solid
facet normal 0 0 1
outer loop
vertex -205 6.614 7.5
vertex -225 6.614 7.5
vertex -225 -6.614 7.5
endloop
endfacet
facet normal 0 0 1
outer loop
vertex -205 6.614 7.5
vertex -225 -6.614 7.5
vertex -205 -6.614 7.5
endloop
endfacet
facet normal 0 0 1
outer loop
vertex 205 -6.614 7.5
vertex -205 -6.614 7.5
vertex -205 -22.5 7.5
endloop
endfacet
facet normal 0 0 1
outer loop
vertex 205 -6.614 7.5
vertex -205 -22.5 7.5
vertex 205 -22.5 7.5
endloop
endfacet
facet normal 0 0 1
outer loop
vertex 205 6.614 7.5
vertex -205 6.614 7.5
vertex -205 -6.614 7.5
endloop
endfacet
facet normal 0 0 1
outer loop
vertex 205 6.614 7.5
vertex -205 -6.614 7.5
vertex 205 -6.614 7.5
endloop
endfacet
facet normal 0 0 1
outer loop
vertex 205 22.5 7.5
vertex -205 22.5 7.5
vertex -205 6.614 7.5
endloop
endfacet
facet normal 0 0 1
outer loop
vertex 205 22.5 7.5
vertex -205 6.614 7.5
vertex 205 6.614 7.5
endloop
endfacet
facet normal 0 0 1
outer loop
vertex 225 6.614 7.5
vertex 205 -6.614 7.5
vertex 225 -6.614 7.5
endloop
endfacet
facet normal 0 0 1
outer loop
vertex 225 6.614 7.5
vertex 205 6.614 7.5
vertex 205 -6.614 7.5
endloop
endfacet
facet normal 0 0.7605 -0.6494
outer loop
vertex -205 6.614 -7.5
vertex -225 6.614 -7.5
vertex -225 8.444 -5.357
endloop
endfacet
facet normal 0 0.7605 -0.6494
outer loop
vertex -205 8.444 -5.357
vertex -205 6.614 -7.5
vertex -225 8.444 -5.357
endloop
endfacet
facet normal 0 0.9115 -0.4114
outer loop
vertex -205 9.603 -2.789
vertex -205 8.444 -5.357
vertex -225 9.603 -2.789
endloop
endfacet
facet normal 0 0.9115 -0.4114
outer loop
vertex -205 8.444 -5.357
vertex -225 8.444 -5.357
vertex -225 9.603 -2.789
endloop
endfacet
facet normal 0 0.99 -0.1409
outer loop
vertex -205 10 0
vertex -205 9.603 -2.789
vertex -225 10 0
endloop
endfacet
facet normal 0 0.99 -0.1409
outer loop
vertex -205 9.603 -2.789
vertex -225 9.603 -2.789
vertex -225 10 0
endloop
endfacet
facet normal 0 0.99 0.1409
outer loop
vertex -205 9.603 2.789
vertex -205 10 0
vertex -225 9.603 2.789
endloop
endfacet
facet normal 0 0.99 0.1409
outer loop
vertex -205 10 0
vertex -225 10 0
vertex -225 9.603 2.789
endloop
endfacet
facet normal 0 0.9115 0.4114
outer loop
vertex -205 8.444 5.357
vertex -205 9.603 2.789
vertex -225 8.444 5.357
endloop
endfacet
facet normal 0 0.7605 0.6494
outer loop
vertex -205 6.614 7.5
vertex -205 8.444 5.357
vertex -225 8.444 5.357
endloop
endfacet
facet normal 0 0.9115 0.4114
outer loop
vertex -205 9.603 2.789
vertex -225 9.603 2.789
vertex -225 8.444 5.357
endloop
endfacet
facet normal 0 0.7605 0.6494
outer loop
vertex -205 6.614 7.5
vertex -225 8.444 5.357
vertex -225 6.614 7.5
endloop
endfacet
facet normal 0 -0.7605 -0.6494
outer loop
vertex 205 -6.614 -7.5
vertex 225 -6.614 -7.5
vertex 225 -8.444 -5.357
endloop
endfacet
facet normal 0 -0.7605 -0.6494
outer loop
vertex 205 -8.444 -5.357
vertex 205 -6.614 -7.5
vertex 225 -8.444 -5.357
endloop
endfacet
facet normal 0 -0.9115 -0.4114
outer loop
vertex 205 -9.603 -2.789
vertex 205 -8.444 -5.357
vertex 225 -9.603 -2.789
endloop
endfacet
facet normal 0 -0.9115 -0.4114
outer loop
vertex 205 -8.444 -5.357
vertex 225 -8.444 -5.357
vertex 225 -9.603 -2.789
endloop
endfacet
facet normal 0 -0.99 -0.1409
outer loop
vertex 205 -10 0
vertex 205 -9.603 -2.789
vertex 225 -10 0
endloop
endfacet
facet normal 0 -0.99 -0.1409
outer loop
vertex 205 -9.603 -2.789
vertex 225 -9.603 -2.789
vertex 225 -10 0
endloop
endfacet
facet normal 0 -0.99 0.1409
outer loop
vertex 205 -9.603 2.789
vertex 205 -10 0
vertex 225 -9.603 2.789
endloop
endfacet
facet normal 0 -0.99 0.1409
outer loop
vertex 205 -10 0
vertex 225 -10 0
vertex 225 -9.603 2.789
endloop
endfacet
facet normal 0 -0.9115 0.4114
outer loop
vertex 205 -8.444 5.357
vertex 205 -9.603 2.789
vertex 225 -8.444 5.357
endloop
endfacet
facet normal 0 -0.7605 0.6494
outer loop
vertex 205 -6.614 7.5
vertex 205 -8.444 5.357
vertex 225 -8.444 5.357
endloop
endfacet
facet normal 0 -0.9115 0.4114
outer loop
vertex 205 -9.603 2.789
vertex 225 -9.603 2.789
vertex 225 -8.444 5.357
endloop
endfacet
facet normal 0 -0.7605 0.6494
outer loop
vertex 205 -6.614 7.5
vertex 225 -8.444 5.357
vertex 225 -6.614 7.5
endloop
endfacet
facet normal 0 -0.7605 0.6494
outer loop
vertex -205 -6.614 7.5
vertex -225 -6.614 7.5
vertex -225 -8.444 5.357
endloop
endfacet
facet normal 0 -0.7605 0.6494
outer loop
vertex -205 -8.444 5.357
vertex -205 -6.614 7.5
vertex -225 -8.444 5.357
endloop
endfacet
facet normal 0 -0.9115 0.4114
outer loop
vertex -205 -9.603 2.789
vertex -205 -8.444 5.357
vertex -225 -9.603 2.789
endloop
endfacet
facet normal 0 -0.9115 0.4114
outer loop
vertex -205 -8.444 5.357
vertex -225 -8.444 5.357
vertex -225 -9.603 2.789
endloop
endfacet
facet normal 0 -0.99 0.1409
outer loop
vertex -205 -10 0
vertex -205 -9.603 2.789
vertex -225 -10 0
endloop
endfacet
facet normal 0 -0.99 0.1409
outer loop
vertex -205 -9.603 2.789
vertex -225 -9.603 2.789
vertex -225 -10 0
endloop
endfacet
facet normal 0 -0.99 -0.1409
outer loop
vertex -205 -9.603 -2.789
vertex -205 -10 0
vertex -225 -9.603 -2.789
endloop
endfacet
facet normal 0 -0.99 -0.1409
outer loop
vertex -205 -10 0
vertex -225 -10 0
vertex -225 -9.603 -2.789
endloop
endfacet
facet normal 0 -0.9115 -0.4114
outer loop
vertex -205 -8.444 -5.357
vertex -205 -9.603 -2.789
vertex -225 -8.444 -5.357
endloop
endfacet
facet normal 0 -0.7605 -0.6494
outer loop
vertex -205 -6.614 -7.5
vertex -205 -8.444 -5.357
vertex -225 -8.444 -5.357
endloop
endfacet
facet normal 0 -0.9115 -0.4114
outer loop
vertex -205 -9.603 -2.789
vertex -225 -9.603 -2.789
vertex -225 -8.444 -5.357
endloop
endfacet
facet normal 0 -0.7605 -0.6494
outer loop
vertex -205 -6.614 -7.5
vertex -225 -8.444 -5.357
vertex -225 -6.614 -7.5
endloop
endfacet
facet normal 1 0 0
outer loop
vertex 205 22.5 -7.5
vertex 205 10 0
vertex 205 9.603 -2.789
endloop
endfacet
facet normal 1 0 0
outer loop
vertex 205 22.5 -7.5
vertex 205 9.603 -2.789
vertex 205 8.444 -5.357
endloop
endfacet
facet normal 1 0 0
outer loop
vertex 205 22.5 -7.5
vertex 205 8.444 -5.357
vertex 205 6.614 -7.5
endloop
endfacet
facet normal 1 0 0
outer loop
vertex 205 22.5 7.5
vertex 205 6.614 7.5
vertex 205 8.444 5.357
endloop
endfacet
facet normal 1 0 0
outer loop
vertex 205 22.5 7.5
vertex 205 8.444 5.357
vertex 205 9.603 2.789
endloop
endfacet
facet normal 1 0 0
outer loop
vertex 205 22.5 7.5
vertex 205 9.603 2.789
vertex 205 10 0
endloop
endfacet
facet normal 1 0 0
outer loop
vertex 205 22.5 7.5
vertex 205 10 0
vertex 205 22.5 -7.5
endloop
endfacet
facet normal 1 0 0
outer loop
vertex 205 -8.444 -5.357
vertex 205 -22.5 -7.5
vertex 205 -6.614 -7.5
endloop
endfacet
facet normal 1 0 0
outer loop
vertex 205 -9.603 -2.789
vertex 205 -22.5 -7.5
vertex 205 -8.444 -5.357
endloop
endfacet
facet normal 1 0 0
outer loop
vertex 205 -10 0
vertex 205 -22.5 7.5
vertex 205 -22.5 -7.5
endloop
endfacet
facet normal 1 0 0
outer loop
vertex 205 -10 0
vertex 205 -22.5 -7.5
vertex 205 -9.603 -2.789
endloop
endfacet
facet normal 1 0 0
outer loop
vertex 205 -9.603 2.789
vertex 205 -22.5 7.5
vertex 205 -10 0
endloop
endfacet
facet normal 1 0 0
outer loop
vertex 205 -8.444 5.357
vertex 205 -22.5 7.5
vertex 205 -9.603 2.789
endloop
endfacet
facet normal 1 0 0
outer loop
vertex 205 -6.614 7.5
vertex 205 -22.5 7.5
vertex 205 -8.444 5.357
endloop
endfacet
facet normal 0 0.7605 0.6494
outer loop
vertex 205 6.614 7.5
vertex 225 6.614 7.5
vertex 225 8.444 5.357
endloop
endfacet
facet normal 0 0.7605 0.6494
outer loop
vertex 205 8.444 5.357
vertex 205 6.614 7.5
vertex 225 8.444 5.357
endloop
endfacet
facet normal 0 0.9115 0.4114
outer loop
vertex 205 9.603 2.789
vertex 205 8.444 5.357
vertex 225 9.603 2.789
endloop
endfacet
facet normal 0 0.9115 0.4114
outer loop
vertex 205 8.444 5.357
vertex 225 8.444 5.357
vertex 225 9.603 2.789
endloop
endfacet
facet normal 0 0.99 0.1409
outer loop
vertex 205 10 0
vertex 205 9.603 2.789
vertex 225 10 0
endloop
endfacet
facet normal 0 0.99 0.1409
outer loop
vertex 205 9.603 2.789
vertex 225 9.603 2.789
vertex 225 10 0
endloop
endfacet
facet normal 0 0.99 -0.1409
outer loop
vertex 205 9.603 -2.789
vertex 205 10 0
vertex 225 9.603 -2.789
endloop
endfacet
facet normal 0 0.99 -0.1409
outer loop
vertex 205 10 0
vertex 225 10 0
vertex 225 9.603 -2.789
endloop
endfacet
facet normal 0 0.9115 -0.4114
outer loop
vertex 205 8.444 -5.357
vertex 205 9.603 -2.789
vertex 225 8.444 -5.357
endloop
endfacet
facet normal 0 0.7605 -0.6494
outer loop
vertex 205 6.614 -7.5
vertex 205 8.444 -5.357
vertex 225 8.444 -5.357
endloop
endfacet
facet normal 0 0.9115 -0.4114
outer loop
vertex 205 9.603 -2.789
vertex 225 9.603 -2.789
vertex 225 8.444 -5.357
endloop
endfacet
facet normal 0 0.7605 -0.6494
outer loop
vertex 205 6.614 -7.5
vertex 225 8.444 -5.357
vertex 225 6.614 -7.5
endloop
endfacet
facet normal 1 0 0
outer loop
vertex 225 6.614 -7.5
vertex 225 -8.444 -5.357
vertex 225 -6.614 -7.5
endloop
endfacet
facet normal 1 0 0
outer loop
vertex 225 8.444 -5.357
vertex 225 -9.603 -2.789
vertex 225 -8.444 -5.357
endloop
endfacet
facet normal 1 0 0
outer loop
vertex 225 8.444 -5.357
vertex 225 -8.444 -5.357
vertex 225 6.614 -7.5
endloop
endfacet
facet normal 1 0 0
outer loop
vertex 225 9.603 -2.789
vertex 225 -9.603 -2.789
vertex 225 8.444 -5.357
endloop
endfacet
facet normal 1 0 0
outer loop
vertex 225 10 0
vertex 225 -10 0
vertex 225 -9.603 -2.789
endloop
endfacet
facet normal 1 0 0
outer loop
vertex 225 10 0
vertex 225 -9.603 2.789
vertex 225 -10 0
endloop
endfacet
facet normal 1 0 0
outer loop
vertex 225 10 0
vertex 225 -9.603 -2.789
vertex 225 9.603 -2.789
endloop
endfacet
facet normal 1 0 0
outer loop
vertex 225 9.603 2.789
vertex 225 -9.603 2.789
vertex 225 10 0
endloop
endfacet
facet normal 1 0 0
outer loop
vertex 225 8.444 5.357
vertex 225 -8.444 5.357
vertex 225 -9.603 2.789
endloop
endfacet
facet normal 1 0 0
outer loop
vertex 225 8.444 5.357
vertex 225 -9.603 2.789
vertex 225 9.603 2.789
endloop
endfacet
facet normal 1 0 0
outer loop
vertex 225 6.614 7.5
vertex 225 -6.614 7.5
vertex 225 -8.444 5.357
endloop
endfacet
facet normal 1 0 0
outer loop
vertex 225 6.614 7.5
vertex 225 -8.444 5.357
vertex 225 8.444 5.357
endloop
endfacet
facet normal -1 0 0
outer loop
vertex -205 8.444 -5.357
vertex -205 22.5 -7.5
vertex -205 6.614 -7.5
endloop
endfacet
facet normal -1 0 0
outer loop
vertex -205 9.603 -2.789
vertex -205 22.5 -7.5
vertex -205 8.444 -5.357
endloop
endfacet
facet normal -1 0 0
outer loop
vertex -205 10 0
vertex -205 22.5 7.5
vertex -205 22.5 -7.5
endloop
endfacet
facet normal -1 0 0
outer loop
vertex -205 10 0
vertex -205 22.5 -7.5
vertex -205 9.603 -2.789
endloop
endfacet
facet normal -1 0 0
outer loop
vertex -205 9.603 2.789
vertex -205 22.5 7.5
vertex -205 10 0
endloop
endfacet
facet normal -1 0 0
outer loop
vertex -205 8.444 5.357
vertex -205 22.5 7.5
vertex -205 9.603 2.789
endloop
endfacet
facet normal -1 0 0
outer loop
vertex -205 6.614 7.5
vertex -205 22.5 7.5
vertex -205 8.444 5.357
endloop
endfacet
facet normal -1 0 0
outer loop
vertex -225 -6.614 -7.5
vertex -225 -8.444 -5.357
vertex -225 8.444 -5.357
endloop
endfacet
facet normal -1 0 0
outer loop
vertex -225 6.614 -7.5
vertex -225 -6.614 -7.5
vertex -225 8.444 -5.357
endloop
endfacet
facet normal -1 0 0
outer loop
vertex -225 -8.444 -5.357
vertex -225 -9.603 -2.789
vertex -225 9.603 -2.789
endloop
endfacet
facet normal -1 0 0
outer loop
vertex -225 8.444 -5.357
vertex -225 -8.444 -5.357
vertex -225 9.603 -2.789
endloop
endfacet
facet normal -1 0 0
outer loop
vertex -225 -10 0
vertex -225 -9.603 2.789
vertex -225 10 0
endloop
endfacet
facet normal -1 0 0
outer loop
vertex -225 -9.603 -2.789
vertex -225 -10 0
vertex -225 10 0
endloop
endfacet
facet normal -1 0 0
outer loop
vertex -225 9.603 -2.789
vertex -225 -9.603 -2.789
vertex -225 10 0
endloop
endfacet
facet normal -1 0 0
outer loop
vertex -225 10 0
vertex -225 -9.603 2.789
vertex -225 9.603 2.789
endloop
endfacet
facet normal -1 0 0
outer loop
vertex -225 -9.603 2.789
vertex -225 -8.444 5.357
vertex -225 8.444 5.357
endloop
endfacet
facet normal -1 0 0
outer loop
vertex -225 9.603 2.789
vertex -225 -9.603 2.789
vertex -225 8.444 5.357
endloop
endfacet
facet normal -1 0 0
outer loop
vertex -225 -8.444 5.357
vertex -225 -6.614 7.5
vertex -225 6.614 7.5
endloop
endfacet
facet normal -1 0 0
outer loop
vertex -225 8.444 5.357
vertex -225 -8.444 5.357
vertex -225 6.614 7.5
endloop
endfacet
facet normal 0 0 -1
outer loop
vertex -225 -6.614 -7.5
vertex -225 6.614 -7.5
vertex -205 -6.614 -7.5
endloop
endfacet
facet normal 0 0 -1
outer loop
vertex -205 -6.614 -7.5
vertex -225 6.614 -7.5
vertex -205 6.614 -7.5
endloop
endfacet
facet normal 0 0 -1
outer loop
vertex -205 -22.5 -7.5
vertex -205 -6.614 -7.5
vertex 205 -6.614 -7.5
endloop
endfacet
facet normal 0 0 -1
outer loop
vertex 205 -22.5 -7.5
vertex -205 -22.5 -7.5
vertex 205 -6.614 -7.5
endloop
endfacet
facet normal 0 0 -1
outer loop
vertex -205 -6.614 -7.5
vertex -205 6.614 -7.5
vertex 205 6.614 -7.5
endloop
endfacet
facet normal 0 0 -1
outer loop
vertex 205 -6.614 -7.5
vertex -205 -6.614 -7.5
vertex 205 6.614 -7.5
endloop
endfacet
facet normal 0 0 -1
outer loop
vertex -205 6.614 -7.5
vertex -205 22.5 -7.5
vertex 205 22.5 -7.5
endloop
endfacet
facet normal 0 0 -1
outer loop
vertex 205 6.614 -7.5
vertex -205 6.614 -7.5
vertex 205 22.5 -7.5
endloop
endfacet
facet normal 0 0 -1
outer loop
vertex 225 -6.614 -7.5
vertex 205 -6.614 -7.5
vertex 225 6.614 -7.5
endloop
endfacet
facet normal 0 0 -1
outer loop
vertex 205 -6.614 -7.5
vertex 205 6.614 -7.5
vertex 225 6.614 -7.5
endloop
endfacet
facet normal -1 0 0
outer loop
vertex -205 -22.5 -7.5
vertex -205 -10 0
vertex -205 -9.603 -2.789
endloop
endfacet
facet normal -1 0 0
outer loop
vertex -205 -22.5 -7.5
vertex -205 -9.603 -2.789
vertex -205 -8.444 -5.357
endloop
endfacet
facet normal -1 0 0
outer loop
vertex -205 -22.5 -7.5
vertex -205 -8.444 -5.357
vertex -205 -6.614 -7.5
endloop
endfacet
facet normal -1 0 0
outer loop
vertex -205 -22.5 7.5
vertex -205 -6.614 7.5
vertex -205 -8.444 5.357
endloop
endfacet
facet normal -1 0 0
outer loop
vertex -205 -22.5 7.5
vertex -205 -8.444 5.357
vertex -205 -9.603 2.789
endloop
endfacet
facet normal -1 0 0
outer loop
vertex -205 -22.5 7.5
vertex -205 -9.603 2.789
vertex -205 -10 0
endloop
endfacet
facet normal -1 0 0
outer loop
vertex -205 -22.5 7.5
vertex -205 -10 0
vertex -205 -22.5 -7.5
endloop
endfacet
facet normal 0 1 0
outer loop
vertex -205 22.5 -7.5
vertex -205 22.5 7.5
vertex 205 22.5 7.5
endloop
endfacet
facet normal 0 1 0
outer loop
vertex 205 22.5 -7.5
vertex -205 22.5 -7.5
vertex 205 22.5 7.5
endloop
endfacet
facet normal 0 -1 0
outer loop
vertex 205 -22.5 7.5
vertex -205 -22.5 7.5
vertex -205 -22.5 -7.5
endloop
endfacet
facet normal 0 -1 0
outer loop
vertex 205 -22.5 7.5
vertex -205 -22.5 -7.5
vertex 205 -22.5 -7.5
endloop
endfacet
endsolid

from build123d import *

# Parameters (mm, degrees)
F0_W     = 450
F0_H     = 45
F1_DEPTH = 7.5
F3_DEPTH = 20
F5_DEPTH = 20


with BuildPart() as f1:
    # F0 (on Top) → F1 (new body, symmetric)
    with BuildSketch(Plane.XY):
        Rectangle(F0_W, F0_H)
    extrude(amount=F1_DEPTH, both=True)

    # F2 (on face) → F3 (cut)
    with BuildSketch(Plane.YZ.offset(225)):
        with BuildLine():
            Line((22.5, 7.5), (6.6143782777, 7.5))
            ThreePointArc((6.6143782777, 7.5), (10, 0), (6.6143782777, -7.5))
            Line((6.6143782777, -7.5), (22.5, -7.5))
            Line((22.5, -7.5), (22.5, 7.5))
        make_face()
        with BuildLine():
            ThreePointArc((-6.6143782777, -7.5), (-10, 0), (-6.6143782777, 7.5))
            Line((-6.6143782777, 7.5), (-22.5, 7.5))
            Line((-22.5, 7.5), (-22.5, -7.5))
            Line((-22.5, -7.5), (-6.6143782777, -7.5))
        make_face()
    extrude(amount=-F3_DEPTH, mode=Mode.SUBTRACT)

    # F4 (on face) → F5 (cut)
    with BuildSketch(Plane(origin=(-225, 0, 0), x_dir=(0, -1, 0), z_dir=(-1, 0, 0))):
        with BuildLine():
            Line((22.5, 7.5), (6.6143782777, 7.5))
            ThreePointArc((6.6143782777, 7.5), (10, 0), (6.6143782777, -7.5))
            Line((6.6143782777, -7.5), (22.5, -7.5))
            Line((22.5, -7.5), (22.5, 7.5))
        make_face()
        with BuildLine():
            ThreePointArc((-6.6143782777, -7.5), (-10, 0), (-6.6143782777, 7.5))
            Line((-6.6143782777, 7.5), (-22.5, 7.5))
            Line((-22.5, 7.5), (-22.5, -7.5))
            Line((-22.5, -7.5), (-6.6143782777, -7.5))
        make_face()
    extrude(amount=-F5_DEPTH, mode=Mode.SUBTRACT)


solid = f1.part
